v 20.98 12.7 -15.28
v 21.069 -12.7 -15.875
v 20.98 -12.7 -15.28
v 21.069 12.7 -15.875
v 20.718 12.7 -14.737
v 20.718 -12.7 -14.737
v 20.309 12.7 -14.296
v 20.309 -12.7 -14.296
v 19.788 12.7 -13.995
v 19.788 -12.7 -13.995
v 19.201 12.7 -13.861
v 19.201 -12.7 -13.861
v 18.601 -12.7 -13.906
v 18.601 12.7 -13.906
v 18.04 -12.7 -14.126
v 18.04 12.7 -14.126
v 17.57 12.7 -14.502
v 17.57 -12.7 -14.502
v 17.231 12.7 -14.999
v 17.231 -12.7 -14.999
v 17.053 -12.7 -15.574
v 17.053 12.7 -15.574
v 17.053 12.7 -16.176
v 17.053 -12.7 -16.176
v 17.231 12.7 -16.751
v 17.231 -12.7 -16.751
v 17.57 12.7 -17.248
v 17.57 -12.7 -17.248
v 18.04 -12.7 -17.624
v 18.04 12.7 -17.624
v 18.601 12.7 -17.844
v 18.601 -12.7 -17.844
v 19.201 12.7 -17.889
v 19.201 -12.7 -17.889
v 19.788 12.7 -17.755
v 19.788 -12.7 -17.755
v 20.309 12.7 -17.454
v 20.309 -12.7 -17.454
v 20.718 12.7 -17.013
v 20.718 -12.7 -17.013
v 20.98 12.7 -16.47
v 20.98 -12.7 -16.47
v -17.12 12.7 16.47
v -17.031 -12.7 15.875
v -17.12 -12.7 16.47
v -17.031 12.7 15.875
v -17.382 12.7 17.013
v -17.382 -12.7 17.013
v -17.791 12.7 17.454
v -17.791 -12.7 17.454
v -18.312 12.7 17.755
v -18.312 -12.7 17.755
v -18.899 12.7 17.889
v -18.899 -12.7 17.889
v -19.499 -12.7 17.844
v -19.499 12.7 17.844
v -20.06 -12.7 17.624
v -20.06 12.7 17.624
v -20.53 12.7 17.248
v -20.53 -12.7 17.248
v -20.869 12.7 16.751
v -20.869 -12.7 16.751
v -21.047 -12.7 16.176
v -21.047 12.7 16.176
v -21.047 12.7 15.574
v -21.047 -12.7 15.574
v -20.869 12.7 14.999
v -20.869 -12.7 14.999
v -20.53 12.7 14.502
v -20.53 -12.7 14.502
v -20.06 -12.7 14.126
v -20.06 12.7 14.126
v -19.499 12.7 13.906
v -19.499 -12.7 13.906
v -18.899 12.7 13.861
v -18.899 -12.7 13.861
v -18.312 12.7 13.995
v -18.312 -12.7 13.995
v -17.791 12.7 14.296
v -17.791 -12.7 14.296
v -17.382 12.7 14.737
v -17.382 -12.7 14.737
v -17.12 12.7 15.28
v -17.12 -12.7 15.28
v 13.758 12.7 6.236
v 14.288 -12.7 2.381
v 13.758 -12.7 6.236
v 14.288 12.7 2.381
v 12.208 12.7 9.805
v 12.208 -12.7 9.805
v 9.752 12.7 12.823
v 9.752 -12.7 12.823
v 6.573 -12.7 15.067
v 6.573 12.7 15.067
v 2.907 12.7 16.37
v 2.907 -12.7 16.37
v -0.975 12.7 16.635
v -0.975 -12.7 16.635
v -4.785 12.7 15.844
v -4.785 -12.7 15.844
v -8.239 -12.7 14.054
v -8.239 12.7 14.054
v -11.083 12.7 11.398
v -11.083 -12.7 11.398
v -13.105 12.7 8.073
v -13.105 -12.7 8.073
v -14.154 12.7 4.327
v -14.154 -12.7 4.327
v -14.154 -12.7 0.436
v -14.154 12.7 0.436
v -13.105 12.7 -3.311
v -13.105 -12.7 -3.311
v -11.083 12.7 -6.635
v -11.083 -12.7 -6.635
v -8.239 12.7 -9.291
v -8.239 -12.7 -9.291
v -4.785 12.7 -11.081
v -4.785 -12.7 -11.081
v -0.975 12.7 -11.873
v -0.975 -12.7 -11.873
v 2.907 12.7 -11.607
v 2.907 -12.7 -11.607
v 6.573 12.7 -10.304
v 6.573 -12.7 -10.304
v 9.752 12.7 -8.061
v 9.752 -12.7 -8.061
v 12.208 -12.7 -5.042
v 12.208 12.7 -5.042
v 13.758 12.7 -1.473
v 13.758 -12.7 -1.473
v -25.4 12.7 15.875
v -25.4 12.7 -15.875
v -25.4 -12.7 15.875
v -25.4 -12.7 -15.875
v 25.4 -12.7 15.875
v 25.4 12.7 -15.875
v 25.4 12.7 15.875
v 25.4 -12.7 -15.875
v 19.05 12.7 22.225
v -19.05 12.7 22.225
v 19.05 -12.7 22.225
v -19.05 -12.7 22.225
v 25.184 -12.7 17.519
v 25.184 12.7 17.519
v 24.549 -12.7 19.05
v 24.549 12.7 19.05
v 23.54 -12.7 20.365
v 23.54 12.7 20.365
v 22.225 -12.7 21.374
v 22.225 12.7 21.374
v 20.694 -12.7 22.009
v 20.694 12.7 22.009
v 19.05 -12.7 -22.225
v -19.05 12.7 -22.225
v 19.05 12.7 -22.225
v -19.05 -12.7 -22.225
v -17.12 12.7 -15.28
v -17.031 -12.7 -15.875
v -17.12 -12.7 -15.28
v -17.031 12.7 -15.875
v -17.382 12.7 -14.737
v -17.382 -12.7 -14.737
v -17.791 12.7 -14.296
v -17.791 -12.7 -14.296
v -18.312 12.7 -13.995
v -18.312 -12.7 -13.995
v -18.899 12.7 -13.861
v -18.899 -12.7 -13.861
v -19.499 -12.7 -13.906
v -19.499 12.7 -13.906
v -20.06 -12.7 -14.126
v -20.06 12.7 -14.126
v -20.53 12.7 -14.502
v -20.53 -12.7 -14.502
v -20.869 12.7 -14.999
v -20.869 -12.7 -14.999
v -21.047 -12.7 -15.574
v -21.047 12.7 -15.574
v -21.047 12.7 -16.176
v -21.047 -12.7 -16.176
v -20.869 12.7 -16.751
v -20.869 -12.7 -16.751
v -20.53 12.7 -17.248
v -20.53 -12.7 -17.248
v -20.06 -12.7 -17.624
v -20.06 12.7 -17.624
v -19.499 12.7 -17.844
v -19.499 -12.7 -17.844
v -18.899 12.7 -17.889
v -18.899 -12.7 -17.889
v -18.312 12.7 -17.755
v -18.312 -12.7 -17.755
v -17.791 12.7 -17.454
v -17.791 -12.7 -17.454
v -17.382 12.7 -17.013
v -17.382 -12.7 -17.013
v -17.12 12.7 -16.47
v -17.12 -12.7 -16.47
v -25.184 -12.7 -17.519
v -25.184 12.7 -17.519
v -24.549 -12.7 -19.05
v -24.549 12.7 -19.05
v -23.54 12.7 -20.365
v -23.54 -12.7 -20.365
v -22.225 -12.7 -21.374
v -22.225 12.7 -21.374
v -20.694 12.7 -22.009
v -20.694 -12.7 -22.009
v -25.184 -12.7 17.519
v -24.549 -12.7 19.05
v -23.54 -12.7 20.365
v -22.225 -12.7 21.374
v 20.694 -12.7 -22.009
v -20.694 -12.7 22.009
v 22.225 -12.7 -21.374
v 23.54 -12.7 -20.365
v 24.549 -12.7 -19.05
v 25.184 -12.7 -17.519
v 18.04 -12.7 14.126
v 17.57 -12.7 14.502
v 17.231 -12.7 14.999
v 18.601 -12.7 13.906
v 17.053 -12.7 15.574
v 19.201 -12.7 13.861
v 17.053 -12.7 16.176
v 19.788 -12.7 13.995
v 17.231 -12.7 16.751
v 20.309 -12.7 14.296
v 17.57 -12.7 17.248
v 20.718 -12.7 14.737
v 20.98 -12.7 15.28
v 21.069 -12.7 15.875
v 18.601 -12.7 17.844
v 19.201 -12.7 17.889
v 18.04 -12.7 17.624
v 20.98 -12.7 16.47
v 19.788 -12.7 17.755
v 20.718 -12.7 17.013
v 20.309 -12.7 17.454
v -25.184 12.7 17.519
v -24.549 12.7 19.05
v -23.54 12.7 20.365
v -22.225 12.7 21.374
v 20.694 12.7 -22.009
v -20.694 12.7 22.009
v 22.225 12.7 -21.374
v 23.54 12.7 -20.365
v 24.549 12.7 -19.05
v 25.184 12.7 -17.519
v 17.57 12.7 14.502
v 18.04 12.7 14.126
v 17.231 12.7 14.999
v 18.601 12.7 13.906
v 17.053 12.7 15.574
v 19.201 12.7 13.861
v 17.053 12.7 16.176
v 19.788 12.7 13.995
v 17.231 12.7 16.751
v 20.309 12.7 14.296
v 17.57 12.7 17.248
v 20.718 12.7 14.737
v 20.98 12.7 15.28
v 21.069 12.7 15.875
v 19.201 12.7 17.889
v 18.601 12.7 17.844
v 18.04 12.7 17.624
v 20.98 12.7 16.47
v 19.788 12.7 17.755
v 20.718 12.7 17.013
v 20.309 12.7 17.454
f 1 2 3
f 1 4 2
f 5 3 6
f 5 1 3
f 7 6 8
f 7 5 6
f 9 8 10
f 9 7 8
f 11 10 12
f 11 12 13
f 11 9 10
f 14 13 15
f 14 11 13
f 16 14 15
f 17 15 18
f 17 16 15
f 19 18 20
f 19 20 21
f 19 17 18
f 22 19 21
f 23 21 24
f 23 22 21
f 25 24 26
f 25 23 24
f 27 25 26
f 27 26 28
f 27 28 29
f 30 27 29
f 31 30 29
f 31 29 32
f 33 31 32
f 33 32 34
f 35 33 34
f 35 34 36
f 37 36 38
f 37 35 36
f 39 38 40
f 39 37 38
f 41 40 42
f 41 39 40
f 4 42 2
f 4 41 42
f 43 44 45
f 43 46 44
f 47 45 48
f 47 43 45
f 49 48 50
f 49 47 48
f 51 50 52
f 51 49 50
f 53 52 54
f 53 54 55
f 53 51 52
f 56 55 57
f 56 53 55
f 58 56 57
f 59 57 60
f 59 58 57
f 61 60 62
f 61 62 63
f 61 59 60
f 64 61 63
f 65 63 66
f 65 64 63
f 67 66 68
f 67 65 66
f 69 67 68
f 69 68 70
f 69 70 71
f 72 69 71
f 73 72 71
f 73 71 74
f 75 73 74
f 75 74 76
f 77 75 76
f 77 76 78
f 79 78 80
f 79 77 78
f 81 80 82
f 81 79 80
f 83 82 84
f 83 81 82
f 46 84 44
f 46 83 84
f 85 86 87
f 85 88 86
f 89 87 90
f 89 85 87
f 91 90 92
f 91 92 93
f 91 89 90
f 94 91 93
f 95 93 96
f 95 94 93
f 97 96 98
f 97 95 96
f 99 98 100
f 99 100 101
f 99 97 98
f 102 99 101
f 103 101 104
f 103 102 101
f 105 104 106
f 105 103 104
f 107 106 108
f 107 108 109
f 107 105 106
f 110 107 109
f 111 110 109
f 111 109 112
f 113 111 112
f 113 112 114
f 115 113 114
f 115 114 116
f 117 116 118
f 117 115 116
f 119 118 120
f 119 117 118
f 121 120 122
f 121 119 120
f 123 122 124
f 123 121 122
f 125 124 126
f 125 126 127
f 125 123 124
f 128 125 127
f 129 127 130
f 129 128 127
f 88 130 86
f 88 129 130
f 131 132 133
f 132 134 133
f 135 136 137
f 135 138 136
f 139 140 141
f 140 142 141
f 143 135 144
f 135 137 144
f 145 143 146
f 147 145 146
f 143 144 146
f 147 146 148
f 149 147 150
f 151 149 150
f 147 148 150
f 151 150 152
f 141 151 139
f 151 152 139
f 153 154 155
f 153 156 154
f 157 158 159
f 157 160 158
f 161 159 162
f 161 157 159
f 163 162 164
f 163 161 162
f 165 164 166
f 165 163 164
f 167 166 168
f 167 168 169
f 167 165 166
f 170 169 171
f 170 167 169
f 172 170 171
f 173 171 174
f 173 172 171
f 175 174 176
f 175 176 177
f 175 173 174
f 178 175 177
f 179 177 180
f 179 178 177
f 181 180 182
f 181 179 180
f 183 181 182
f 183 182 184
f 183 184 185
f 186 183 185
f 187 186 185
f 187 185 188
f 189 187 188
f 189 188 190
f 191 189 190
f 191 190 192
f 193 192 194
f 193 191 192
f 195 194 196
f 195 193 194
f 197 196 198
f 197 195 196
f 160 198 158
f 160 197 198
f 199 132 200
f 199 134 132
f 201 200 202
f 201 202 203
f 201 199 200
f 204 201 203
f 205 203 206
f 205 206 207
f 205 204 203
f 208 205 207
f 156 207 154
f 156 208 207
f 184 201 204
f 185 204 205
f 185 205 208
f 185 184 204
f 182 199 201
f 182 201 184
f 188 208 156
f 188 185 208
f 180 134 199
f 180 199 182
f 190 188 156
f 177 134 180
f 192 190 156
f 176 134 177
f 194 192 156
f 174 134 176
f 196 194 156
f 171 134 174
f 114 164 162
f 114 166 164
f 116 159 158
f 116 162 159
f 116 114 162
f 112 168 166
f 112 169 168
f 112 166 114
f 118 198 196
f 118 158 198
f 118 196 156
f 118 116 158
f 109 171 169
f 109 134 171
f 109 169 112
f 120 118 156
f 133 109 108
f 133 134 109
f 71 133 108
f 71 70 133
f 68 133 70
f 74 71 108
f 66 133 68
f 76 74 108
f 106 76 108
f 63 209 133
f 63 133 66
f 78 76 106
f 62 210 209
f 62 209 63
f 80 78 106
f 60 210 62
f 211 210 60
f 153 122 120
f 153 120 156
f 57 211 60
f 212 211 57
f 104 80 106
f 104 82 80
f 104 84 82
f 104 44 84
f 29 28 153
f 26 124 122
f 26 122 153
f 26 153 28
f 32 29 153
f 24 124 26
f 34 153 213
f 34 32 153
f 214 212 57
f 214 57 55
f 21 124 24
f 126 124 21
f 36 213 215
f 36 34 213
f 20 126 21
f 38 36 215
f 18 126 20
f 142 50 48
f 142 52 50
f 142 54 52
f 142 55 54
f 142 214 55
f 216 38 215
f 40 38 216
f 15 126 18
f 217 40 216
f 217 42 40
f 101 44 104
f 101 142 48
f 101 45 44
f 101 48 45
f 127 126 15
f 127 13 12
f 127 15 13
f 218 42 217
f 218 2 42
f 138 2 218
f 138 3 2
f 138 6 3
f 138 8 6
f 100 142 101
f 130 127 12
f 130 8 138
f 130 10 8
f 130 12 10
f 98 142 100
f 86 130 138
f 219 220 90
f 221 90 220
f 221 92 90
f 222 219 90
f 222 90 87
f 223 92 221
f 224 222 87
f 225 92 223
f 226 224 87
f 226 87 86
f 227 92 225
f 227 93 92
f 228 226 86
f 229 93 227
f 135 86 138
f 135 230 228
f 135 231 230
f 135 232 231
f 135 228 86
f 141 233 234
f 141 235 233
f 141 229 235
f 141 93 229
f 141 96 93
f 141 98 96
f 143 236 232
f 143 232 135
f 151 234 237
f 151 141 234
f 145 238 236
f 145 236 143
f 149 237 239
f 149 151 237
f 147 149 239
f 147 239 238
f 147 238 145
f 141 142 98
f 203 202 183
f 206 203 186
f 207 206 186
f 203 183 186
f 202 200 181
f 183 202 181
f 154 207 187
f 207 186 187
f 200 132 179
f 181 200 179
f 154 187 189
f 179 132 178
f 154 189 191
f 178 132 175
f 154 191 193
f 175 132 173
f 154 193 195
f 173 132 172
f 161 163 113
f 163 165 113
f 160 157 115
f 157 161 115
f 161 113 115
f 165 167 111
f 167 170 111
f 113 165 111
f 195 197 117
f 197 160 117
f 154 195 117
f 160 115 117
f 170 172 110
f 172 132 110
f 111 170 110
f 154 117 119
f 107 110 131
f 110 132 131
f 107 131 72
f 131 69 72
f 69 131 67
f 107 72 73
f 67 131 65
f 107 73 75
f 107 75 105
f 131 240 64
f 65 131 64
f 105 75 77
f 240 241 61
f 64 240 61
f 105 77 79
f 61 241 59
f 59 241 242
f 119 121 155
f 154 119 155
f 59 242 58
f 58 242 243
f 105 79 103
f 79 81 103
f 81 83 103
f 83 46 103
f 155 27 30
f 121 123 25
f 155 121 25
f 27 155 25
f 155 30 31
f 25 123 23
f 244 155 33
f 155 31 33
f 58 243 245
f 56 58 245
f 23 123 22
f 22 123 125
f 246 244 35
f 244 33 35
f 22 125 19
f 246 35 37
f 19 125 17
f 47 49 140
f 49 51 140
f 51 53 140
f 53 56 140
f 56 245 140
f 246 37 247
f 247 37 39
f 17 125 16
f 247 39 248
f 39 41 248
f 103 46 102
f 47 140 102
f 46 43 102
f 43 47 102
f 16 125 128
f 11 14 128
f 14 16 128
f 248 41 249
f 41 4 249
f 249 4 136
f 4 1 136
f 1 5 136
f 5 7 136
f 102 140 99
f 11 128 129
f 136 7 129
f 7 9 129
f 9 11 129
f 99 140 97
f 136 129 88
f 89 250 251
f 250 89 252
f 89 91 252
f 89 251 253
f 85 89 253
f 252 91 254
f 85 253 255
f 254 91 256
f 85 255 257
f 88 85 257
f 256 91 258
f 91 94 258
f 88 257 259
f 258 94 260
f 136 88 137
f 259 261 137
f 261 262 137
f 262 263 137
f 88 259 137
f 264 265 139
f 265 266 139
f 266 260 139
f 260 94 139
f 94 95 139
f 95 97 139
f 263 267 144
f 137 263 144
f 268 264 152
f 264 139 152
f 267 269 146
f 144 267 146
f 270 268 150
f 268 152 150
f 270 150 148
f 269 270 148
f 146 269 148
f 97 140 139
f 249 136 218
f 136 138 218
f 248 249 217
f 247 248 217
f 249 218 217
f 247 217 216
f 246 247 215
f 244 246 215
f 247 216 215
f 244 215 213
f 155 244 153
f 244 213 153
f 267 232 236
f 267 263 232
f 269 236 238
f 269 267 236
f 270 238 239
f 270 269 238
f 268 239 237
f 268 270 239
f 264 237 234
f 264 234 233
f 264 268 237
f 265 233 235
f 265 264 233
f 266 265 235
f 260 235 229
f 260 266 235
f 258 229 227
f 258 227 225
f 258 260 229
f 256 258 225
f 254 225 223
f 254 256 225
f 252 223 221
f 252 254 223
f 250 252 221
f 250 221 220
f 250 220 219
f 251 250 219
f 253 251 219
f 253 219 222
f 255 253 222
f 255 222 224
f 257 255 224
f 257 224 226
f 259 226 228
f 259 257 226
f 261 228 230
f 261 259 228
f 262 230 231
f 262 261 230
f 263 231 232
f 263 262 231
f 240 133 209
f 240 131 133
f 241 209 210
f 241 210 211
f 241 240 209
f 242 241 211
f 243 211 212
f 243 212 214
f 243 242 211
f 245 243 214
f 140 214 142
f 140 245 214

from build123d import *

# Parameters (mm, degrees)
F0_W     = 50.8
F0_H     = 44.45
F0_R     = 2.0193
F0_R_2   = 14.2875
F1_DEPTH = 12.7
F2_R     = 6.35


with BuildPart() as f1:
    # F0 (on Front) → F1 (new body, symmetric)
    with BuildSketch(Plane.XZ):
        Rectangle(F0_W, F0_H)
        with Locations((-19.05, -15.875)):
            Circle(F0_R, mode=Mode.SUBTRACT)
        with Locations((19.05, -15.875)):
            Circle(F0_R, mode=Mode.SUBTRACT)
        with Locations((0, 2.38125)):
            Circle(F0_R_2, mode=Mode.SUBTRACT)
        with Locations((-19.05, 15.875)):
            Circle(F0_R, mode=Mode.SUBTRACT)
        with Locations((19.05, 15.875)):
            Circle(F0_R, mode=Mode.SUBTRACT)
    extrude(amount=F1_DEPTH, both=True)

    # F2
    f2_edges = [f1.edges().sort_by_distance(p)[0] for p in [
        (25.4, 0, -22.225),
        (25.4, 0, 22.225),
        (-25.4, 0, 22.225),
        (-25.4, 0, -22.225),
    ]]
    fillet(f2_edges, radius=F2_R)


solid = f1.part
